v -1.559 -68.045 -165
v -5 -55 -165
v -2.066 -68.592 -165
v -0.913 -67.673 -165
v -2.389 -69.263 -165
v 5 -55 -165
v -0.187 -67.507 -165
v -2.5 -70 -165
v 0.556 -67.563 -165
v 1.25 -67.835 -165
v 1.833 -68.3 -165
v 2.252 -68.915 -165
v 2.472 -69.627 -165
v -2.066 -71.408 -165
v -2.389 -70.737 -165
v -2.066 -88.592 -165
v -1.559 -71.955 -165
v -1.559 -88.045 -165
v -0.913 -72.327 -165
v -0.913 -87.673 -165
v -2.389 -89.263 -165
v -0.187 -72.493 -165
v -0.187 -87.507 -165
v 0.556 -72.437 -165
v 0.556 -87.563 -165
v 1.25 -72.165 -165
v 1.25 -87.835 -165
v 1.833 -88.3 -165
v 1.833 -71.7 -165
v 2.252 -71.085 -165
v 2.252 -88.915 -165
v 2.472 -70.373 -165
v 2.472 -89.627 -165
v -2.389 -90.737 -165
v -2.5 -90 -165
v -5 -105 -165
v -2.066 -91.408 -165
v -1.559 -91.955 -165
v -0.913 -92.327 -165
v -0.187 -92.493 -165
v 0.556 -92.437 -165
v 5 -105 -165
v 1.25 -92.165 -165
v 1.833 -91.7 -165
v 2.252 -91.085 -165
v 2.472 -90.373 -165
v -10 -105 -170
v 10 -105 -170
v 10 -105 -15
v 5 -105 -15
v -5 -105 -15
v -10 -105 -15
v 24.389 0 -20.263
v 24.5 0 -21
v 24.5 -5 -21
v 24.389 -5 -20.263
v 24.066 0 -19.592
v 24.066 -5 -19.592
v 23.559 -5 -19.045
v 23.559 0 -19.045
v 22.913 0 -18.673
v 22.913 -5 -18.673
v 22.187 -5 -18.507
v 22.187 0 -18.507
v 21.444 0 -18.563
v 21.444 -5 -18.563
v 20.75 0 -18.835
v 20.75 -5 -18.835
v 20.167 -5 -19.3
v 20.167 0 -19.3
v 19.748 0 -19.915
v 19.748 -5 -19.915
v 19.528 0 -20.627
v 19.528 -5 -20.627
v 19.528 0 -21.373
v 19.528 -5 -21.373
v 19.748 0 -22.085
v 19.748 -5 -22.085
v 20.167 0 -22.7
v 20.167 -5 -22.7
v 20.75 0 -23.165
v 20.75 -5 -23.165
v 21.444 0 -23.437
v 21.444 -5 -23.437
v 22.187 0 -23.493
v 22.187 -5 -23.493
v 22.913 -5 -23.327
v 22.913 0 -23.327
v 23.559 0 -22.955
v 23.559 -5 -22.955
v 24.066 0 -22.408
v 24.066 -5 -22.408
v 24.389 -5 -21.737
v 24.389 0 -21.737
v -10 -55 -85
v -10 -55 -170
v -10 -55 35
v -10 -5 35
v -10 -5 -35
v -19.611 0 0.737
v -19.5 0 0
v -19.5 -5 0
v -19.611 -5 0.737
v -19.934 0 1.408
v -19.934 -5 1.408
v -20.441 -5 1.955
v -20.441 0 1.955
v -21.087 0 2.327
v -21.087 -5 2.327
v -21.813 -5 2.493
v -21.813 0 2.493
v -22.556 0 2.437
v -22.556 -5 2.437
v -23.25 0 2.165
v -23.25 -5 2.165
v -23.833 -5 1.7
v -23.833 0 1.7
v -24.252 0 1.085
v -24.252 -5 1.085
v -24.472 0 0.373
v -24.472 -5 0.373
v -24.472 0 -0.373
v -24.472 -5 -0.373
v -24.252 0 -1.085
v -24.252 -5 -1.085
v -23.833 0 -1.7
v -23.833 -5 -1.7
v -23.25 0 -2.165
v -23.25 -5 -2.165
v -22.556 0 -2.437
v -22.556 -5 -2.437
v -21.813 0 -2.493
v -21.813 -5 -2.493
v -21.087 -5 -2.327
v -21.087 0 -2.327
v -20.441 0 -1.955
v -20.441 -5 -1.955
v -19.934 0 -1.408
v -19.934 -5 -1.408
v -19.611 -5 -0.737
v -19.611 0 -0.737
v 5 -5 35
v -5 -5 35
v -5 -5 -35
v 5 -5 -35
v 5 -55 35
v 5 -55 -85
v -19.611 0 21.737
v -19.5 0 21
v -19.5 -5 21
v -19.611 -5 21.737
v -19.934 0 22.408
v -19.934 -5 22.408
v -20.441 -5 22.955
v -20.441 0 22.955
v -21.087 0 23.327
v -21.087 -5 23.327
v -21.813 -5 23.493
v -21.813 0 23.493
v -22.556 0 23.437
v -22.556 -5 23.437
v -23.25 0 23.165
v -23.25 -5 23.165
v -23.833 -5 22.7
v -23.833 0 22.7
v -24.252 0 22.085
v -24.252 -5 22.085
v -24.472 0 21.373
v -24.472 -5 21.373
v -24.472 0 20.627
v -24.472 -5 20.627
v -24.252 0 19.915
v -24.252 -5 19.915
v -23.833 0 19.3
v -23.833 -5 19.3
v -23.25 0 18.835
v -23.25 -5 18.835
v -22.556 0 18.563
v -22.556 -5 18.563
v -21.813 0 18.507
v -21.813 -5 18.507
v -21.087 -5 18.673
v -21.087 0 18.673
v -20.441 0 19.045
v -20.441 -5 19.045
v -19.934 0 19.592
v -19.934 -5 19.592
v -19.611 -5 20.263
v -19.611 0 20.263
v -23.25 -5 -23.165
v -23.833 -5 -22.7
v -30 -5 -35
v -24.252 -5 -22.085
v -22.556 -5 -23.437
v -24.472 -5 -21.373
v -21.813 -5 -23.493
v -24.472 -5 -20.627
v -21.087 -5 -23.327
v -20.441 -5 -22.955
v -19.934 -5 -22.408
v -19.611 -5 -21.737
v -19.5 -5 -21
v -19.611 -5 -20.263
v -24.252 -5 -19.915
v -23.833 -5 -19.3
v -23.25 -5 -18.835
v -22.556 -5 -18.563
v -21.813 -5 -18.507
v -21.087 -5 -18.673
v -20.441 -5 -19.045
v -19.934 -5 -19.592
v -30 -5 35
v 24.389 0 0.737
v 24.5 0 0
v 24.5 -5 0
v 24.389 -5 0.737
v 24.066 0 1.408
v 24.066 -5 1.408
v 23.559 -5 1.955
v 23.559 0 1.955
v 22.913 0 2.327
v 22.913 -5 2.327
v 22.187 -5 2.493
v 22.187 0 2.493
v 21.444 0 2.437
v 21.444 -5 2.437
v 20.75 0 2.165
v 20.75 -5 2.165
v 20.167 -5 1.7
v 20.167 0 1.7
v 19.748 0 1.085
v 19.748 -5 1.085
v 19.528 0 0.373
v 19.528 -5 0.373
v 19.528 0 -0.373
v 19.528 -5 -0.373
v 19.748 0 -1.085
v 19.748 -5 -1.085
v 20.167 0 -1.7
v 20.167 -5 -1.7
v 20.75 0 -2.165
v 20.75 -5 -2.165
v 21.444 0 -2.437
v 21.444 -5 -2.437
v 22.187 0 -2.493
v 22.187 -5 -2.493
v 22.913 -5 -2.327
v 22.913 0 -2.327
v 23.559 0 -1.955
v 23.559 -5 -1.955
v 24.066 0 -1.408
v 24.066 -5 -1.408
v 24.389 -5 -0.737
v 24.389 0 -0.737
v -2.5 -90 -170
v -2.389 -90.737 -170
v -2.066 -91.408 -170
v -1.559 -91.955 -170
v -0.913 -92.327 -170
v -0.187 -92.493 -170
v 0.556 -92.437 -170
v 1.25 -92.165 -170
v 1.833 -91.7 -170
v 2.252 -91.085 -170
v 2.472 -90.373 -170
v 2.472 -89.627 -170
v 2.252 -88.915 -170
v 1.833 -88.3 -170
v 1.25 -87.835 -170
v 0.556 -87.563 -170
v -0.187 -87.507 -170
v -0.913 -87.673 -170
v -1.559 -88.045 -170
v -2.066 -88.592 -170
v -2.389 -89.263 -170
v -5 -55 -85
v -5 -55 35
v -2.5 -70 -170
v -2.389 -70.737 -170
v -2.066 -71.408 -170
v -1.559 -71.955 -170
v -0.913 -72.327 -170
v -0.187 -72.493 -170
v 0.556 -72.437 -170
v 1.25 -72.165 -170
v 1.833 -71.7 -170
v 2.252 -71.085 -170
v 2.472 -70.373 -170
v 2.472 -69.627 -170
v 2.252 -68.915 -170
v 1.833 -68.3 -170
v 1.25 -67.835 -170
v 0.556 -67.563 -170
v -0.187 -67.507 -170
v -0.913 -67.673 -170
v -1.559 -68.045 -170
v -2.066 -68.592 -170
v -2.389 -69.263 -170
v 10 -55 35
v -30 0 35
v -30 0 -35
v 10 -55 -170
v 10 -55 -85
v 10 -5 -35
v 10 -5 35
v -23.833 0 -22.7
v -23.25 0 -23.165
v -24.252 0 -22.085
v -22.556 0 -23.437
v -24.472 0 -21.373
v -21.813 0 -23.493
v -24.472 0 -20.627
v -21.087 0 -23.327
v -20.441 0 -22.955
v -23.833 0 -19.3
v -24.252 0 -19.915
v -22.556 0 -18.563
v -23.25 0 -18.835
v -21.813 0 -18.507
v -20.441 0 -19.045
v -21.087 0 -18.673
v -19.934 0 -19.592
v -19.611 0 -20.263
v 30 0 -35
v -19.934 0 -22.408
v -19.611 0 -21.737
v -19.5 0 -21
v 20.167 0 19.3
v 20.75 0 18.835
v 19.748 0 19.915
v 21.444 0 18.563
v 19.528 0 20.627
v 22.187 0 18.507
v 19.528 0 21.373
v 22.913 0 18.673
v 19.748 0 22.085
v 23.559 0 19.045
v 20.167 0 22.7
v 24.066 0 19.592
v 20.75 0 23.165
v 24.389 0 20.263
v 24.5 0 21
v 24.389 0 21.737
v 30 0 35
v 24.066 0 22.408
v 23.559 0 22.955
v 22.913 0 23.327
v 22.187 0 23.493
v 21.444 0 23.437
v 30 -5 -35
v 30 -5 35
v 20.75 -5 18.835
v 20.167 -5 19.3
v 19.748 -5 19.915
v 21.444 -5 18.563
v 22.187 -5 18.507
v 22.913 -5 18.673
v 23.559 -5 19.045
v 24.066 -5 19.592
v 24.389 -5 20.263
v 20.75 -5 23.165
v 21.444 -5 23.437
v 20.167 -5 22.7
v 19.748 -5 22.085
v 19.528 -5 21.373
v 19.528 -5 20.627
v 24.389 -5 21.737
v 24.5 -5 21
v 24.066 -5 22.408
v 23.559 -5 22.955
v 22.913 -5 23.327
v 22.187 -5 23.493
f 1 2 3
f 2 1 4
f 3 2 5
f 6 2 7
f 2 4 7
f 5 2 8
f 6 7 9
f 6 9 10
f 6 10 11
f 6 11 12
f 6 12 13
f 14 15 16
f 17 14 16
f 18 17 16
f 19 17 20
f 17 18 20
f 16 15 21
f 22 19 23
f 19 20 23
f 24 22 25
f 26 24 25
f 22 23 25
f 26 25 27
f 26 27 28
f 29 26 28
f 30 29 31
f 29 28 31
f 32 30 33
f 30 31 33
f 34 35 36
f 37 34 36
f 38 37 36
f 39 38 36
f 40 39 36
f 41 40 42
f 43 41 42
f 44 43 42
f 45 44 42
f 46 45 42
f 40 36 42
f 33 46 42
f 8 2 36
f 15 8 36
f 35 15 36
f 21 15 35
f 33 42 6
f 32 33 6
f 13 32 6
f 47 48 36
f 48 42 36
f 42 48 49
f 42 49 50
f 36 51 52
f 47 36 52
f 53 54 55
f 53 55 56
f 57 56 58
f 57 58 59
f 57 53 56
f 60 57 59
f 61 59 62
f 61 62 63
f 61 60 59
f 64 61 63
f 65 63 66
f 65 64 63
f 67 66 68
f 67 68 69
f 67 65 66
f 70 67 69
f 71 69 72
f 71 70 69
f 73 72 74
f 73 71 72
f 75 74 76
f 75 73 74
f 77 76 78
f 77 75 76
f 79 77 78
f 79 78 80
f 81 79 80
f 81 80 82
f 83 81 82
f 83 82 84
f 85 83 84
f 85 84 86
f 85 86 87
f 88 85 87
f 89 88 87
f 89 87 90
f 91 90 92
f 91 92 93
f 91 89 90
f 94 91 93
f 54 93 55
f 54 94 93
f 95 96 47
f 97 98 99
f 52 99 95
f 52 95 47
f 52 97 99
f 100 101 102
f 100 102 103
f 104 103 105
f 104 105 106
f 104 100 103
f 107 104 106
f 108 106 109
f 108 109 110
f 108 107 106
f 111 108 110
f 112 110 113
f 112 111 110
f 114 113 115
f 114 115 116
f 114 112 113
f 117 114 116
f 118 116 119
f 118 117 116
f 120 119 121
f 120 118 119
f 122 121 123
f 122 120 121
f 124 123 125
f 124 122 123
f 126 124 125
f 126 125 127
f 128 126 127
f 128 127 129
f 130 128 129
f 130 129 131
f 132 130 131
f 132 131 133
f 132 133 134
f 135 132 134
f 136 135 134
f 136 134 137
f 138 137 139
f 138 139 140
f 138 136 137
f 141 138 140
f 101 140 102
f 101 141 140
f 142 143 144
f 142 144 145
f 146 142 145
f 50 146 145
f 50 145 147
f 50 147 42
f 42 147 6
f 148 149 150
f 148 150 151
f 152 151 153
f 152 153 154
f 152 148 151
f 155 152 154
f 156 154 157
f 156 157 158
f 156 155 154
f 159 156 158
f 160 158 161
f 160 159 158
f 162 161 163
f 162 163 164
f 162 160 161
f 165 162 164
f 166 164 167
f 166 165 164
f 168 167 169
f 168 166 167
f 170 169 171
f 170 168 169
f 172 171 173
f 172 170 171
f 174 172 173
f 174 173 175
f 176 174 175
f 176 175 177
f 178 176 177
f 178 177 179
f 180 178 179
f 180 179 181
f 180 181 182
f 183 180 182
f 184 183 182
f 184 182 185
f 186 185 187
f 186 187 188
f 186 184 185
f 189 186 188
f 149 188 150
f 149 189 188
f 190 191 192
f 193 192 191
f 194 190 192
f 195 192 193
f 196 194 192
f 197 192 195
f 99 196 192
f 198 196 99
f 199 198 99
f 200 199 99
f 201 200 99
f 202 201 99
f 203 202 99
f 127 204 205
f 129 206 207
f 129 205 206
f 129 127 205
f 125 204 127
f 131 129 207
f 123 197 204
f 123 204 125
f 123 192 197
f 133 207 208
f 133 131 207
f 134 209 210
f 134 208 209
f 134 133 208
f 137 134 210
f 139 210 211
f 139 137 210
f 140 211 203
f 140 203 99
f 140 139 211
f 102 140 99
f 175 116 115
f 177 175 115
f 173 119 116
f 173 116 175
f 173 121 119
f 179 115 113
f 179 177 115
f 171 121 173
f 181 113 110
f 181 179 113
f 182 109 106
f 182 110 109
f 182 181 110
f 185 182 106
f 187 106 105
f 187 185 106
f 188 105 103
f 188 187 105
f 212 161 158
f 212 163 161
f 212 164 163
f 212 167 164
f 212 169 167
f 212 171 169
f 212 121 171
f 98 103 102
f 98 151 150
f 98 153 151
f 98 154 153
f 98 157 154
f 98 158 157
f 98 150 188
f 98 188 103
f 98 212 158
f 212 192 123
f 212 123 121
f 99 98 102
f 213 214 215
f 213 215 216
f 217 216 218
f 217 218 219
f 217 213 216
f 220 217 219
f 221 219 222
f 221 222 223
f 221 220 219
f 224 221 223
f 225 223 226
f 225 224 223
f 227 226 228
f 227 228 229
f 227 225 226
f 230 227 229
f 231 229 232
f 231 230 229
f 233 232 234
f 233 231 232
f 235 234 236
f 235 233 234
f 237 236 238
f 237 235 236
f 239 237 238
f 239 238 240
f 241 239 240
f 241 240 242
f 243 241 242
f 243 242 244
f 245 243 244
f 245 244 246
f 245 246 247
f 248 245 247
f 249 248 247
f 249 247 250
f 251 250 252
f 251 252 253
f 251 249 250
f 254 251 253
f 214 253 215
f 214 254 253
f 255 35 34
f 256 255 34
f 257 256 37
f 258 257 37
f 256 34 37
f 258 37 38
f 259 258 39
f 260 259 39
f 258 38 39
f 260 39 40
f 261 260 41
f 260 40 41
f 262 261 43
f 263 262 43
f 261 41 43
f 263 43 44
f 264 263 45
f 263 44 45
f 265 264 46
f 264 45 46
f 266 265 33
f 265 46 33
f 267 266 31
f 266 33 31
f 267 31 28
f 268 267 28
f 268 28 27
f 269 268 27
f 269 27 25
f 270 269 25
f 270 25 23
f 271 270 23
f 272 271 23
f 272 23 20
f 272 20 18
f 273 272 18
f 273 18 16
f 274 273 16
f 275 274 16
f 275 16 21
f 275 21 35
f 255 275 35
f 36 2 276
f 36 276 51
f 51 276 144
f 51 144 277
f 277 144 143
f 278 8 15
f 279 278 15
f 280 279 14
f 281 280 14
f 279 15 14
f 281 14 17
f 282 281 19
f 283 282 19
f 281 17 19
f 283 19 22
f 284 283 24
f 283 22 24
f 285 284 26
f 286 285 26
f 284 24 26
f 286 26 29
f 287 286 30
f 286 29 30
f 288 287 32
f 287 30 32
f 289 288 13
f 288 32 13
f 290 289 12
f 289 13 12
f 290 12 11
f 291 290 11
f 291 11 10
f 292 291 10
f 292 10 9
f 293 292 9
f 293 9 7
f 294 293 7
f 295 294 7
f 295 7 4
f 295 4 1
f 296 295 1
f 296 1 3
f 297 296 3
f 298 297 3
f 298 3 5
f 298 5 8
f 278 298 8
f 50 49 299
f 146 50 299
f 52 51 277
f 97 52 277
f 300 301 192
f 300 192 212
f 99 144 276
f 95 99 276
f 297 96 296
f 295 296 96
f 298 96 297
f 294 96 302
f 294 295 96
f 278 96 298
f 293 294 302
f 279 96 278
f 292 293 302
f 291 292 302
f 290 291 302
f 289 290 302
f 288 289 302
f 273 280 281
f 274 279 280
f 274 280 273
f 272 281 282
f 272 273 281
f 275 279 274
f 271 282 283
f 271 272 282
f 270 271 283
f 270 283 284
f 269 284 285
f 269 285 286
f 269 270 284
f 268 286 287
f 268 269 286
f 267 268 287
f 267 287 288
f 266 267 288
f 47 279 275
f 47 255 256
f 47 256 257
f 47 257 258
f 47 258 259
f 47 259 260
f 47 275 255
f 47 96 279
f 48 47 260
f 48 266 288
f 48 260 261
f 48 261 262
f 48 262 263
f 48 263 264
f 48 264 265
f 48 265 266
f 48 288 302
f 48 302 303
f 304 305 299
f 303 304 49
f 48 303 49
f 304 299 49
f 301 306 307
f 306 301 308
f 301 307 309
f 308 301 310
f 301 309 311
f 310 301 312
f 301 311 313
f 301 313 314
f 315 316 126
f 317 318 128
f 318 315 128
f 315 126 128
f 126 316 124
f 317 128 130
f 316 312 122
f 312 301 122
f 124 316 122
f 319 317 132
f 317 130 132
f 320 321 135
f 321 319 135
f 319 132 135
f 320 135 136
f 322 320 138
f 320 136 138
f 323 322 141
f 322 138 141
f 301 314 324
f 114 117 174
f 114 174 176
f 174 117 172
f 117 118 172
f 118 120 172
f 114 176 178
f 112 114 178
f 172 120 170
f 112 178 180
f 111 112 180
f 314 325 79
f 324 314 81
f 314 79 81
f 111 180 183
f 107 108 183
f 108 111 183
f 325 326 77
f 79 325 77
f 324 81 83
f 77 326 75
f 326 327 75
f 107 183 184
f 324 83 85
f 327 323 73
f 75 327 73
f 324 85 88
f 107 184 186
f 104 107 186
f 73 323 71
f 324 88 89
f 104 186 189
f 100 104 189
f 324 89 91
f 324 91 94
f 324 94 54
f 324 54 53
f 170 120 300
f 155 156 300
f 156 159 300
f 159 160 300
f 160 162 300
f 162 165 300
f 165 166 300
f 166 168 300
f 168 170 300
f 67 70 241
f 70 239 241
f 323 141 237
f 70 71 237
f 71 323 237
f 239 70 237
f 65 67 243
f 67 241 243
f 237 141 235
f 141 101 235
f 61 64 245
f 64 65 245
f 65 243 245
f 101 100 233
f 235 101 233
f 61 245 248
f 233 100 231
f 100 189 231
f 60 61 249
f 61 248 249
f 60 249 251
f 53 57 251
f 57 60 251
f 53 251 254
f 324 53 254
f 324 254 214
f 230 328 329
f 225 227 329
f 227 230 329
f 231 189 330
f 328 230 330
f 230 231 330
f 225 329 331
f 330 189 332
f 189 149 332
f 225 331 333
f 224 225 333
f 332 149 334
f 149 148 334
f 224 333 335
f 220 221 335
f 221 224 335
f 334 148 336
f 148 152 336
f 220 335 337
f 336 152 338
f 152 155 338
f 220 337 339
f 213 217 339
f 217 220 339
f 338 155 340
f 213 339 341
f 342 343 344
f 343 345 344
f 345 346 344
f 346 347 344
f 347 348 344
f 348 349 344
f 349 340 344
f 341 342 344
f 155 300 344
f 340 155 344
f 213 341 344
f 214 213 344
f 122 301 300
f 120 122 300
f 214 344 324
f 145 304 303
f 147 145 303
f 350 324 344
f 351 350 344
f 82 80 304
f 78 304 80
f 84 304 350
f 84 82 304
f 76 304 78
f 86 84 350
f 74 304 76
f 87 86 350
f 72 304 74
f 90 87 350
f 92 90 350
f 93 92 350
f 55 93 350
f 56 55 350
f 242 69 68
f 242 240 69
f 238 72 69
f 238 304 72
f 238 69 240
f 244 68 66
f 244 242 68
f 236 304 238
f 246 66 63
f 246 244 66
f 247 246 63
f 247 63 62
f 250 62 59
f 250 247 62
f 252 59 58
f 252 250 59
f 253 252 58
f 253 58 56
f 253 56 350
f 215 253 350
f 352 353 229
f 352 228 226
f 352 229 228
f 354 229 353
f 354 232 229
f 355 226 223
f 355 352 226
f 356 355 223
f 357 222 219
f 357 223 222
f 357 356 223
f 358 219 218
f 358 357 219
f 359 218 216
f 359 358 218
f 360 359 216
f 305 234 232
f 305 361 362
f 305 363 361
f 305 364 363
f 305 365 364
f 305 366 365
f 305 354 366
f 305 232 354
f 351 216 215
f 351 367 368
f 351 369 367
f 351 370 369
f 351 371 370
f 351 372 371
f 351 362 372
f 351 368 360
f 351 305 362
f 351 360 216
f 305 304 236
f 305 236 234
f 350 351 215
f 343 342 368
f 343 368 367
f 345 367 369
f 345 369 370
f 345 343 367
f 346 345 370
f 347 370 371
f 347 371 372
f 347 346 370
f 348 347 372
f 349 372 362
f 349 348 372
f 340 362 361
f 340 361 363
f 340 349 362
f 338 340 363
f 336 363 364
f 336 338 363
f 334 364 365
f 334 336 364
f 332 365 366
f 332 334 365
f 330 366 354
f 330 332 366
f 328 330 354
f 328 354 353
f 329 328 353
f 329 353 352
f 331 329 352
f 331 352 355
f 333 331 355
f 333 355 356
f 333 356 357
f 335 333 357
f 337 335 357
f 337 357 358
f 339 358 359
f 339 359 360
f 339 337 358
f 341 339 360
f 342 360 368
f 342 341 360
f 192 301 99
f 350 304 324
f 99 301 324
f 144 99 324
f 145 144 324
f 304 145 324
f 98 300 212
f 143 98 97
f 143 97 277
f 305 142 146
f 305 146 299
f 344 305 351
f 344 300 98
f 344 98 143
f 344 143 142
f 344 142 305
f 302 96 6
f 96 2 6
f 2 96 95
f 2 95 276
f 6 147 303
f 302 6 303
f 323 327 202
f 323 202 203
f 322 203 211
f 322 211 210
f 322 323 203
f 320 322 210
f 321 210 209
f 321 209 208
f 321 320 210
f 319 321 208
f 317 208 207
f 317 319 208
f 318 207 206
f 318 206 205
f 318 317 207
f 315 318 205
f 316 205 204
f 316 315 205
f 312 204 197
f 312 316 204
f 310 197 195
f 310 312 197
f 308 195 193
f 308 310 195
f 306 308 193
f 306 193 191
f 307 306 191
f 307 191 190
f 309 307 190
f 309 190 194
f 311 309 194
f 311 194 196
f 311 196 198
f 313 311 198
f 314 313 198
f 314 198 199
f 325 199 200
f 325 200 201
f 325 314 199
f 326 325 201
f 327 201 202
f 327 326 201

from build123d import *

# Parameters (mm, degrees)
F0_W     = 60
F0_H     = 70
F0_R     = 2.5
F1_DEPTH = 5
F2_W     = 5
F2_H     = 130
F2_H_2   = 70
F3_DEPTH = 100
F5_DEPTH = 25
F6_W     = 15
F6_H     = 50
F6_W_2   = 5
F7_DEPTH = 5
F9_D     = 5
F9_DEPTH = 40


with BuildPart() as f1:
    # F0 (on Front) → F1 (new body)
    with BuildSketch(Plane.XZ):
        Rectangle(F0_W, F0_H)
        with Locations((-22, -21)):
            Circle(F0_R, mode=Mode.SUBTRACT)
        with Locations((22, -21)):
            Circle(F0_R, mode=Mode.SUBTRACT)
        with Locations((-22, 0)):
            Circle(F0_R, mode=Mode.SUBTRACT)
        with Locations((-22, 21)):
            Circle(F0_R, mode=Mode.SUBTRACT)
        with Locations((22, 0)):
            Circle(F0_R, mode=Mode.SUBTRACT)
        with Locations((22, 21)):
            Circle(F0_R, mode=Mode.SUBTRACT)
    extrude(amount=F1_DEPTH)

    # F2 (on face) → F3 (join)
    with BuildSketch(Plane.XZ.offset(5)):
        with Locations((-7.5, -100)):
            Rectangle(F2_W, F2_H)
        with Locations((-7.5, 0)):
            Rectangle(F2_W, F2_H_2)
        with Locations((7.5, 0)):
            Rectangle(F2_W, F2_H_2)
        with Locations((7.5, -100)):
            Rectangle(F2_W, F2_H)
    extrude(amount=F3_DEPTH)

    # F4 (on face) → F5 (cut)
    with BuildSketch(Plane.YZ.offset(10)):
        Polygon((-105, -15), (-55, 35), (-105, 35), align=None)
        Polygon((-5, -165), (-5, -35), (-55, -85), (-55, -165), align=None)
    extrude(amount=-F5_DEPTH, mode=Mode.SUBTRACT)

    # F6 (on face) → F7 (join)
    with BuildSketch(Plane(origin=(0, 0, -165), x_dir=(1, 0, 0), z_dir=(0, 0, -1))):
        with Locations((-2.5, 80)):
            Rectangle(F6_W, F6_H)
        with Locations((7.5, 80)):
            Rectangle(F6_W_2, F6_H)
    extrude(amount=F7_DEPTH)

    # F9
    with Locations(Plane(origin=(0, 0, -170), x_dir=(1, 0, 0), z_dir=(0, 0, -1))):
        with Locations((0, 90), (0, 70)):
            Hole(F9_D / 2, depth=F9_DEPTH)


solid = f1.part
